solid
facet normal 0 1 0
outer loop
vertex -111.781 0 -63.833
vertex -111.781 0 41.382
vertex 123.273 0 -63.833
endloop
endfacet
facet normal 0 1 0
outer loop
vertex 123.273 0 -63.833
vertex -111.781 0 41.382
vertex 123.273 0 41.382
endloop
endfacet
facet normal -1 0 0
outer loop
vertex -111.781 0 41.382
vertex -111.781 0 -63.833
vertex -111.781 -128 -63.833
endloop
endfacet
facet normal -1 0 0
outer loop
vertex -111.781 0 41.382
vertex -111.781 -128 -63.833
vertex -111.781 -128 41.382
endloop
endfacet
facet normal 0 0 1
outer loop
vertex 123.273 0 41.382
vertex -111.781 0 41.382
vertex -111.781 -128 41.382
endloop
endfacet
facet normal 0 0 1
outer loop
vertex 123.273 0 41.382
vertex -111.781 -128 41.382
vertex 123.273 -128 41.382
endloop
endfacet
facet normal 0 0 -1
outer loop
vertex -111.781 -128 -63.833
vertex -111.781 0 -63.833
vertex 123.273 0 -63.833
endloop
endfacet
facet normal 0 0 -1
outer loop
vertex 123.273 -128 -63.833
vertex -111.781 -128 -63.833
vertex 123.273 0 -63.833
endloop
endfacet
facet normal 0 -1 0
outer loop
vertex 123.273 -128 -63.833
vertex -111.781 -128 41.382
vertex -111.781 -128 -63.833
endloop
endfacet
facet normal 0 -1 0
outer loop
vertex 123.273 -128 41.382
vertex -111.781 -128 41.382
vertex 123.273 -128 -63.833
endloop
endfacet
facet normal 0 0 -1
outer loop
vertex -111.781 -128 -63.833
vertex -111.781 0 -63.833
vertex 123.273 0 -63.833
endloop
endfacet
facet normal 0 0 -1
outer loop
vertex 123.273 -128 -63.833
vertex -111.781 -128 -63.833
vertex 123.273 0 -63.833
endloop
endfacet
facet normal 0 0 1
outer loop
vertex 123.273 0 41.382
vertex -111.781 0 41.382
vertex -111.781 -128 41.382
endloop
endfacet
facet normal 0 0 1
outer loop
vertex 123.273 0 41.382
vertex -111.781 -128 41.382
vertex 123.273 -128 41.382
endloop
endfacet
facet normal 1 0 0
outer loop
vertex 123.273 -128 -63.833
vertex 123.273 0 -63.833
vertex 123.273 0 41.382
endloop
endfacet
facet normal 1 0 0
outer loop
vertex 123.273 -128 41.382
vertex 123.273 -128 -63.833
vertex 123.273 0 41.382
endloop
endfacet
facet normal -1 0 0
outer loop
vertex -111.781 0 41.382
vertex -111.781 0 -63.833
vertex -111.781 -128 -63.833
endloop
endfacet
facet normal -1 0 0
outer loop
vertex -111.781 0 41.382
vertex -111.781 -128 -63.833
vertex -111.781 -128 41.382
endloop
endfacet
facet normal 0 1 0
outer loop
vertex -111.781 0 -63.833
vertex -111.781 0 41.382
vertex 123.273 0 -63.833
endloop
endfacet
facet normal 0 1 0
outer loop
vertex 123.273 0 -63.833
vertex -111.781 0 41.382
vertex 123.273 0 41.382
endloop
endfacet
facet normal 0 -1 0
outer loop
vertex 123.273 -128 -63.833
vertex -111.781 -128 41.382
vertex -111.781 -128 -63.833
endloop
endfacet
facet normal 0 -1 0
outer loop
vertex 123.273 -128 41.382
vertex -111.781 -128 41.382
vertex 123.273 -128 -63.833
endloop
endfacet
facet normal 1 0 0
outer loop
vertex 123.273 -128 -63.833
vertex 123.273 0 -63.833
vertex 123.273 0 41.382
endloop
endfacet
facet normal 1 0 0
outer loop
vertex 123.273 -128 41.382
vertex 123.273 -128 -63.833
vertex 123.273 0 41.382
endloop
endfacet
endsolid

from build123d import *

# Parameters (mm, degrees)
F0_W     = 235.053807497
F0_H     = 105.2150577307
F2_DEPTH = 128
F1_W     = 235.053807497
F1_H     = 105.2150577307
F1_R     = 15.0244451301
F1_R_2   = 20.5909250724
F1_R_3   = 12.9669209458
F1_R_4   = 11.722784582


with BuildPart() as f2:
    # F0 (on Front) → F2 (new body)
    with BuildSketch(Plane.XZ):
        with Locations((5.7457536459, -11.2257748842)):
            Rectangle(F0_W, F0_H)
    extrude(amount=F2_DEPTH)


with BuildPart() as f2b:
    # F1 (on face) → F2, piece 2 (new body)
    with BuildSketch(Plane.XZ):
        with Locations((5.7457536459, -11.2257748842)):
            Rectangle(F1_W, F1_H)
        with Locations((83.9229151607, -42.4591824412)):
            Circle(F1_R, mode=Mode.SUBTRACT)
        with Locations((3.1340499409, -9.3679996207)):
            Circle(F1_R_2, mode=Mode.SUBTRACT)
        with Locations((-95.4144373536, 22.0787003636)):
            Circle(F1_R_3, mode=Mode.SUBTRACT)
        with Locations((70.6902518868, 27.1969623864)):
            Circle(F1_R_4, mode=Mode.SUBTRACT)
        with Locations((3.1340499409, -9.3679996207)):
            Circle(F1_R_2)
        with Locations((83.9229151607, -42.4591824412)):
            Circle(F1_R)
        with Locations((-95.4144373536, 22.0787003636)):
            Circle(F1_R_3)
        with Locations((70.6902518868, 27.1969623864)):
            Circle(F1_R_4)
    extrude(amount=F2_DEPTH)


solid = Compound([f2.part, f2b.part])
